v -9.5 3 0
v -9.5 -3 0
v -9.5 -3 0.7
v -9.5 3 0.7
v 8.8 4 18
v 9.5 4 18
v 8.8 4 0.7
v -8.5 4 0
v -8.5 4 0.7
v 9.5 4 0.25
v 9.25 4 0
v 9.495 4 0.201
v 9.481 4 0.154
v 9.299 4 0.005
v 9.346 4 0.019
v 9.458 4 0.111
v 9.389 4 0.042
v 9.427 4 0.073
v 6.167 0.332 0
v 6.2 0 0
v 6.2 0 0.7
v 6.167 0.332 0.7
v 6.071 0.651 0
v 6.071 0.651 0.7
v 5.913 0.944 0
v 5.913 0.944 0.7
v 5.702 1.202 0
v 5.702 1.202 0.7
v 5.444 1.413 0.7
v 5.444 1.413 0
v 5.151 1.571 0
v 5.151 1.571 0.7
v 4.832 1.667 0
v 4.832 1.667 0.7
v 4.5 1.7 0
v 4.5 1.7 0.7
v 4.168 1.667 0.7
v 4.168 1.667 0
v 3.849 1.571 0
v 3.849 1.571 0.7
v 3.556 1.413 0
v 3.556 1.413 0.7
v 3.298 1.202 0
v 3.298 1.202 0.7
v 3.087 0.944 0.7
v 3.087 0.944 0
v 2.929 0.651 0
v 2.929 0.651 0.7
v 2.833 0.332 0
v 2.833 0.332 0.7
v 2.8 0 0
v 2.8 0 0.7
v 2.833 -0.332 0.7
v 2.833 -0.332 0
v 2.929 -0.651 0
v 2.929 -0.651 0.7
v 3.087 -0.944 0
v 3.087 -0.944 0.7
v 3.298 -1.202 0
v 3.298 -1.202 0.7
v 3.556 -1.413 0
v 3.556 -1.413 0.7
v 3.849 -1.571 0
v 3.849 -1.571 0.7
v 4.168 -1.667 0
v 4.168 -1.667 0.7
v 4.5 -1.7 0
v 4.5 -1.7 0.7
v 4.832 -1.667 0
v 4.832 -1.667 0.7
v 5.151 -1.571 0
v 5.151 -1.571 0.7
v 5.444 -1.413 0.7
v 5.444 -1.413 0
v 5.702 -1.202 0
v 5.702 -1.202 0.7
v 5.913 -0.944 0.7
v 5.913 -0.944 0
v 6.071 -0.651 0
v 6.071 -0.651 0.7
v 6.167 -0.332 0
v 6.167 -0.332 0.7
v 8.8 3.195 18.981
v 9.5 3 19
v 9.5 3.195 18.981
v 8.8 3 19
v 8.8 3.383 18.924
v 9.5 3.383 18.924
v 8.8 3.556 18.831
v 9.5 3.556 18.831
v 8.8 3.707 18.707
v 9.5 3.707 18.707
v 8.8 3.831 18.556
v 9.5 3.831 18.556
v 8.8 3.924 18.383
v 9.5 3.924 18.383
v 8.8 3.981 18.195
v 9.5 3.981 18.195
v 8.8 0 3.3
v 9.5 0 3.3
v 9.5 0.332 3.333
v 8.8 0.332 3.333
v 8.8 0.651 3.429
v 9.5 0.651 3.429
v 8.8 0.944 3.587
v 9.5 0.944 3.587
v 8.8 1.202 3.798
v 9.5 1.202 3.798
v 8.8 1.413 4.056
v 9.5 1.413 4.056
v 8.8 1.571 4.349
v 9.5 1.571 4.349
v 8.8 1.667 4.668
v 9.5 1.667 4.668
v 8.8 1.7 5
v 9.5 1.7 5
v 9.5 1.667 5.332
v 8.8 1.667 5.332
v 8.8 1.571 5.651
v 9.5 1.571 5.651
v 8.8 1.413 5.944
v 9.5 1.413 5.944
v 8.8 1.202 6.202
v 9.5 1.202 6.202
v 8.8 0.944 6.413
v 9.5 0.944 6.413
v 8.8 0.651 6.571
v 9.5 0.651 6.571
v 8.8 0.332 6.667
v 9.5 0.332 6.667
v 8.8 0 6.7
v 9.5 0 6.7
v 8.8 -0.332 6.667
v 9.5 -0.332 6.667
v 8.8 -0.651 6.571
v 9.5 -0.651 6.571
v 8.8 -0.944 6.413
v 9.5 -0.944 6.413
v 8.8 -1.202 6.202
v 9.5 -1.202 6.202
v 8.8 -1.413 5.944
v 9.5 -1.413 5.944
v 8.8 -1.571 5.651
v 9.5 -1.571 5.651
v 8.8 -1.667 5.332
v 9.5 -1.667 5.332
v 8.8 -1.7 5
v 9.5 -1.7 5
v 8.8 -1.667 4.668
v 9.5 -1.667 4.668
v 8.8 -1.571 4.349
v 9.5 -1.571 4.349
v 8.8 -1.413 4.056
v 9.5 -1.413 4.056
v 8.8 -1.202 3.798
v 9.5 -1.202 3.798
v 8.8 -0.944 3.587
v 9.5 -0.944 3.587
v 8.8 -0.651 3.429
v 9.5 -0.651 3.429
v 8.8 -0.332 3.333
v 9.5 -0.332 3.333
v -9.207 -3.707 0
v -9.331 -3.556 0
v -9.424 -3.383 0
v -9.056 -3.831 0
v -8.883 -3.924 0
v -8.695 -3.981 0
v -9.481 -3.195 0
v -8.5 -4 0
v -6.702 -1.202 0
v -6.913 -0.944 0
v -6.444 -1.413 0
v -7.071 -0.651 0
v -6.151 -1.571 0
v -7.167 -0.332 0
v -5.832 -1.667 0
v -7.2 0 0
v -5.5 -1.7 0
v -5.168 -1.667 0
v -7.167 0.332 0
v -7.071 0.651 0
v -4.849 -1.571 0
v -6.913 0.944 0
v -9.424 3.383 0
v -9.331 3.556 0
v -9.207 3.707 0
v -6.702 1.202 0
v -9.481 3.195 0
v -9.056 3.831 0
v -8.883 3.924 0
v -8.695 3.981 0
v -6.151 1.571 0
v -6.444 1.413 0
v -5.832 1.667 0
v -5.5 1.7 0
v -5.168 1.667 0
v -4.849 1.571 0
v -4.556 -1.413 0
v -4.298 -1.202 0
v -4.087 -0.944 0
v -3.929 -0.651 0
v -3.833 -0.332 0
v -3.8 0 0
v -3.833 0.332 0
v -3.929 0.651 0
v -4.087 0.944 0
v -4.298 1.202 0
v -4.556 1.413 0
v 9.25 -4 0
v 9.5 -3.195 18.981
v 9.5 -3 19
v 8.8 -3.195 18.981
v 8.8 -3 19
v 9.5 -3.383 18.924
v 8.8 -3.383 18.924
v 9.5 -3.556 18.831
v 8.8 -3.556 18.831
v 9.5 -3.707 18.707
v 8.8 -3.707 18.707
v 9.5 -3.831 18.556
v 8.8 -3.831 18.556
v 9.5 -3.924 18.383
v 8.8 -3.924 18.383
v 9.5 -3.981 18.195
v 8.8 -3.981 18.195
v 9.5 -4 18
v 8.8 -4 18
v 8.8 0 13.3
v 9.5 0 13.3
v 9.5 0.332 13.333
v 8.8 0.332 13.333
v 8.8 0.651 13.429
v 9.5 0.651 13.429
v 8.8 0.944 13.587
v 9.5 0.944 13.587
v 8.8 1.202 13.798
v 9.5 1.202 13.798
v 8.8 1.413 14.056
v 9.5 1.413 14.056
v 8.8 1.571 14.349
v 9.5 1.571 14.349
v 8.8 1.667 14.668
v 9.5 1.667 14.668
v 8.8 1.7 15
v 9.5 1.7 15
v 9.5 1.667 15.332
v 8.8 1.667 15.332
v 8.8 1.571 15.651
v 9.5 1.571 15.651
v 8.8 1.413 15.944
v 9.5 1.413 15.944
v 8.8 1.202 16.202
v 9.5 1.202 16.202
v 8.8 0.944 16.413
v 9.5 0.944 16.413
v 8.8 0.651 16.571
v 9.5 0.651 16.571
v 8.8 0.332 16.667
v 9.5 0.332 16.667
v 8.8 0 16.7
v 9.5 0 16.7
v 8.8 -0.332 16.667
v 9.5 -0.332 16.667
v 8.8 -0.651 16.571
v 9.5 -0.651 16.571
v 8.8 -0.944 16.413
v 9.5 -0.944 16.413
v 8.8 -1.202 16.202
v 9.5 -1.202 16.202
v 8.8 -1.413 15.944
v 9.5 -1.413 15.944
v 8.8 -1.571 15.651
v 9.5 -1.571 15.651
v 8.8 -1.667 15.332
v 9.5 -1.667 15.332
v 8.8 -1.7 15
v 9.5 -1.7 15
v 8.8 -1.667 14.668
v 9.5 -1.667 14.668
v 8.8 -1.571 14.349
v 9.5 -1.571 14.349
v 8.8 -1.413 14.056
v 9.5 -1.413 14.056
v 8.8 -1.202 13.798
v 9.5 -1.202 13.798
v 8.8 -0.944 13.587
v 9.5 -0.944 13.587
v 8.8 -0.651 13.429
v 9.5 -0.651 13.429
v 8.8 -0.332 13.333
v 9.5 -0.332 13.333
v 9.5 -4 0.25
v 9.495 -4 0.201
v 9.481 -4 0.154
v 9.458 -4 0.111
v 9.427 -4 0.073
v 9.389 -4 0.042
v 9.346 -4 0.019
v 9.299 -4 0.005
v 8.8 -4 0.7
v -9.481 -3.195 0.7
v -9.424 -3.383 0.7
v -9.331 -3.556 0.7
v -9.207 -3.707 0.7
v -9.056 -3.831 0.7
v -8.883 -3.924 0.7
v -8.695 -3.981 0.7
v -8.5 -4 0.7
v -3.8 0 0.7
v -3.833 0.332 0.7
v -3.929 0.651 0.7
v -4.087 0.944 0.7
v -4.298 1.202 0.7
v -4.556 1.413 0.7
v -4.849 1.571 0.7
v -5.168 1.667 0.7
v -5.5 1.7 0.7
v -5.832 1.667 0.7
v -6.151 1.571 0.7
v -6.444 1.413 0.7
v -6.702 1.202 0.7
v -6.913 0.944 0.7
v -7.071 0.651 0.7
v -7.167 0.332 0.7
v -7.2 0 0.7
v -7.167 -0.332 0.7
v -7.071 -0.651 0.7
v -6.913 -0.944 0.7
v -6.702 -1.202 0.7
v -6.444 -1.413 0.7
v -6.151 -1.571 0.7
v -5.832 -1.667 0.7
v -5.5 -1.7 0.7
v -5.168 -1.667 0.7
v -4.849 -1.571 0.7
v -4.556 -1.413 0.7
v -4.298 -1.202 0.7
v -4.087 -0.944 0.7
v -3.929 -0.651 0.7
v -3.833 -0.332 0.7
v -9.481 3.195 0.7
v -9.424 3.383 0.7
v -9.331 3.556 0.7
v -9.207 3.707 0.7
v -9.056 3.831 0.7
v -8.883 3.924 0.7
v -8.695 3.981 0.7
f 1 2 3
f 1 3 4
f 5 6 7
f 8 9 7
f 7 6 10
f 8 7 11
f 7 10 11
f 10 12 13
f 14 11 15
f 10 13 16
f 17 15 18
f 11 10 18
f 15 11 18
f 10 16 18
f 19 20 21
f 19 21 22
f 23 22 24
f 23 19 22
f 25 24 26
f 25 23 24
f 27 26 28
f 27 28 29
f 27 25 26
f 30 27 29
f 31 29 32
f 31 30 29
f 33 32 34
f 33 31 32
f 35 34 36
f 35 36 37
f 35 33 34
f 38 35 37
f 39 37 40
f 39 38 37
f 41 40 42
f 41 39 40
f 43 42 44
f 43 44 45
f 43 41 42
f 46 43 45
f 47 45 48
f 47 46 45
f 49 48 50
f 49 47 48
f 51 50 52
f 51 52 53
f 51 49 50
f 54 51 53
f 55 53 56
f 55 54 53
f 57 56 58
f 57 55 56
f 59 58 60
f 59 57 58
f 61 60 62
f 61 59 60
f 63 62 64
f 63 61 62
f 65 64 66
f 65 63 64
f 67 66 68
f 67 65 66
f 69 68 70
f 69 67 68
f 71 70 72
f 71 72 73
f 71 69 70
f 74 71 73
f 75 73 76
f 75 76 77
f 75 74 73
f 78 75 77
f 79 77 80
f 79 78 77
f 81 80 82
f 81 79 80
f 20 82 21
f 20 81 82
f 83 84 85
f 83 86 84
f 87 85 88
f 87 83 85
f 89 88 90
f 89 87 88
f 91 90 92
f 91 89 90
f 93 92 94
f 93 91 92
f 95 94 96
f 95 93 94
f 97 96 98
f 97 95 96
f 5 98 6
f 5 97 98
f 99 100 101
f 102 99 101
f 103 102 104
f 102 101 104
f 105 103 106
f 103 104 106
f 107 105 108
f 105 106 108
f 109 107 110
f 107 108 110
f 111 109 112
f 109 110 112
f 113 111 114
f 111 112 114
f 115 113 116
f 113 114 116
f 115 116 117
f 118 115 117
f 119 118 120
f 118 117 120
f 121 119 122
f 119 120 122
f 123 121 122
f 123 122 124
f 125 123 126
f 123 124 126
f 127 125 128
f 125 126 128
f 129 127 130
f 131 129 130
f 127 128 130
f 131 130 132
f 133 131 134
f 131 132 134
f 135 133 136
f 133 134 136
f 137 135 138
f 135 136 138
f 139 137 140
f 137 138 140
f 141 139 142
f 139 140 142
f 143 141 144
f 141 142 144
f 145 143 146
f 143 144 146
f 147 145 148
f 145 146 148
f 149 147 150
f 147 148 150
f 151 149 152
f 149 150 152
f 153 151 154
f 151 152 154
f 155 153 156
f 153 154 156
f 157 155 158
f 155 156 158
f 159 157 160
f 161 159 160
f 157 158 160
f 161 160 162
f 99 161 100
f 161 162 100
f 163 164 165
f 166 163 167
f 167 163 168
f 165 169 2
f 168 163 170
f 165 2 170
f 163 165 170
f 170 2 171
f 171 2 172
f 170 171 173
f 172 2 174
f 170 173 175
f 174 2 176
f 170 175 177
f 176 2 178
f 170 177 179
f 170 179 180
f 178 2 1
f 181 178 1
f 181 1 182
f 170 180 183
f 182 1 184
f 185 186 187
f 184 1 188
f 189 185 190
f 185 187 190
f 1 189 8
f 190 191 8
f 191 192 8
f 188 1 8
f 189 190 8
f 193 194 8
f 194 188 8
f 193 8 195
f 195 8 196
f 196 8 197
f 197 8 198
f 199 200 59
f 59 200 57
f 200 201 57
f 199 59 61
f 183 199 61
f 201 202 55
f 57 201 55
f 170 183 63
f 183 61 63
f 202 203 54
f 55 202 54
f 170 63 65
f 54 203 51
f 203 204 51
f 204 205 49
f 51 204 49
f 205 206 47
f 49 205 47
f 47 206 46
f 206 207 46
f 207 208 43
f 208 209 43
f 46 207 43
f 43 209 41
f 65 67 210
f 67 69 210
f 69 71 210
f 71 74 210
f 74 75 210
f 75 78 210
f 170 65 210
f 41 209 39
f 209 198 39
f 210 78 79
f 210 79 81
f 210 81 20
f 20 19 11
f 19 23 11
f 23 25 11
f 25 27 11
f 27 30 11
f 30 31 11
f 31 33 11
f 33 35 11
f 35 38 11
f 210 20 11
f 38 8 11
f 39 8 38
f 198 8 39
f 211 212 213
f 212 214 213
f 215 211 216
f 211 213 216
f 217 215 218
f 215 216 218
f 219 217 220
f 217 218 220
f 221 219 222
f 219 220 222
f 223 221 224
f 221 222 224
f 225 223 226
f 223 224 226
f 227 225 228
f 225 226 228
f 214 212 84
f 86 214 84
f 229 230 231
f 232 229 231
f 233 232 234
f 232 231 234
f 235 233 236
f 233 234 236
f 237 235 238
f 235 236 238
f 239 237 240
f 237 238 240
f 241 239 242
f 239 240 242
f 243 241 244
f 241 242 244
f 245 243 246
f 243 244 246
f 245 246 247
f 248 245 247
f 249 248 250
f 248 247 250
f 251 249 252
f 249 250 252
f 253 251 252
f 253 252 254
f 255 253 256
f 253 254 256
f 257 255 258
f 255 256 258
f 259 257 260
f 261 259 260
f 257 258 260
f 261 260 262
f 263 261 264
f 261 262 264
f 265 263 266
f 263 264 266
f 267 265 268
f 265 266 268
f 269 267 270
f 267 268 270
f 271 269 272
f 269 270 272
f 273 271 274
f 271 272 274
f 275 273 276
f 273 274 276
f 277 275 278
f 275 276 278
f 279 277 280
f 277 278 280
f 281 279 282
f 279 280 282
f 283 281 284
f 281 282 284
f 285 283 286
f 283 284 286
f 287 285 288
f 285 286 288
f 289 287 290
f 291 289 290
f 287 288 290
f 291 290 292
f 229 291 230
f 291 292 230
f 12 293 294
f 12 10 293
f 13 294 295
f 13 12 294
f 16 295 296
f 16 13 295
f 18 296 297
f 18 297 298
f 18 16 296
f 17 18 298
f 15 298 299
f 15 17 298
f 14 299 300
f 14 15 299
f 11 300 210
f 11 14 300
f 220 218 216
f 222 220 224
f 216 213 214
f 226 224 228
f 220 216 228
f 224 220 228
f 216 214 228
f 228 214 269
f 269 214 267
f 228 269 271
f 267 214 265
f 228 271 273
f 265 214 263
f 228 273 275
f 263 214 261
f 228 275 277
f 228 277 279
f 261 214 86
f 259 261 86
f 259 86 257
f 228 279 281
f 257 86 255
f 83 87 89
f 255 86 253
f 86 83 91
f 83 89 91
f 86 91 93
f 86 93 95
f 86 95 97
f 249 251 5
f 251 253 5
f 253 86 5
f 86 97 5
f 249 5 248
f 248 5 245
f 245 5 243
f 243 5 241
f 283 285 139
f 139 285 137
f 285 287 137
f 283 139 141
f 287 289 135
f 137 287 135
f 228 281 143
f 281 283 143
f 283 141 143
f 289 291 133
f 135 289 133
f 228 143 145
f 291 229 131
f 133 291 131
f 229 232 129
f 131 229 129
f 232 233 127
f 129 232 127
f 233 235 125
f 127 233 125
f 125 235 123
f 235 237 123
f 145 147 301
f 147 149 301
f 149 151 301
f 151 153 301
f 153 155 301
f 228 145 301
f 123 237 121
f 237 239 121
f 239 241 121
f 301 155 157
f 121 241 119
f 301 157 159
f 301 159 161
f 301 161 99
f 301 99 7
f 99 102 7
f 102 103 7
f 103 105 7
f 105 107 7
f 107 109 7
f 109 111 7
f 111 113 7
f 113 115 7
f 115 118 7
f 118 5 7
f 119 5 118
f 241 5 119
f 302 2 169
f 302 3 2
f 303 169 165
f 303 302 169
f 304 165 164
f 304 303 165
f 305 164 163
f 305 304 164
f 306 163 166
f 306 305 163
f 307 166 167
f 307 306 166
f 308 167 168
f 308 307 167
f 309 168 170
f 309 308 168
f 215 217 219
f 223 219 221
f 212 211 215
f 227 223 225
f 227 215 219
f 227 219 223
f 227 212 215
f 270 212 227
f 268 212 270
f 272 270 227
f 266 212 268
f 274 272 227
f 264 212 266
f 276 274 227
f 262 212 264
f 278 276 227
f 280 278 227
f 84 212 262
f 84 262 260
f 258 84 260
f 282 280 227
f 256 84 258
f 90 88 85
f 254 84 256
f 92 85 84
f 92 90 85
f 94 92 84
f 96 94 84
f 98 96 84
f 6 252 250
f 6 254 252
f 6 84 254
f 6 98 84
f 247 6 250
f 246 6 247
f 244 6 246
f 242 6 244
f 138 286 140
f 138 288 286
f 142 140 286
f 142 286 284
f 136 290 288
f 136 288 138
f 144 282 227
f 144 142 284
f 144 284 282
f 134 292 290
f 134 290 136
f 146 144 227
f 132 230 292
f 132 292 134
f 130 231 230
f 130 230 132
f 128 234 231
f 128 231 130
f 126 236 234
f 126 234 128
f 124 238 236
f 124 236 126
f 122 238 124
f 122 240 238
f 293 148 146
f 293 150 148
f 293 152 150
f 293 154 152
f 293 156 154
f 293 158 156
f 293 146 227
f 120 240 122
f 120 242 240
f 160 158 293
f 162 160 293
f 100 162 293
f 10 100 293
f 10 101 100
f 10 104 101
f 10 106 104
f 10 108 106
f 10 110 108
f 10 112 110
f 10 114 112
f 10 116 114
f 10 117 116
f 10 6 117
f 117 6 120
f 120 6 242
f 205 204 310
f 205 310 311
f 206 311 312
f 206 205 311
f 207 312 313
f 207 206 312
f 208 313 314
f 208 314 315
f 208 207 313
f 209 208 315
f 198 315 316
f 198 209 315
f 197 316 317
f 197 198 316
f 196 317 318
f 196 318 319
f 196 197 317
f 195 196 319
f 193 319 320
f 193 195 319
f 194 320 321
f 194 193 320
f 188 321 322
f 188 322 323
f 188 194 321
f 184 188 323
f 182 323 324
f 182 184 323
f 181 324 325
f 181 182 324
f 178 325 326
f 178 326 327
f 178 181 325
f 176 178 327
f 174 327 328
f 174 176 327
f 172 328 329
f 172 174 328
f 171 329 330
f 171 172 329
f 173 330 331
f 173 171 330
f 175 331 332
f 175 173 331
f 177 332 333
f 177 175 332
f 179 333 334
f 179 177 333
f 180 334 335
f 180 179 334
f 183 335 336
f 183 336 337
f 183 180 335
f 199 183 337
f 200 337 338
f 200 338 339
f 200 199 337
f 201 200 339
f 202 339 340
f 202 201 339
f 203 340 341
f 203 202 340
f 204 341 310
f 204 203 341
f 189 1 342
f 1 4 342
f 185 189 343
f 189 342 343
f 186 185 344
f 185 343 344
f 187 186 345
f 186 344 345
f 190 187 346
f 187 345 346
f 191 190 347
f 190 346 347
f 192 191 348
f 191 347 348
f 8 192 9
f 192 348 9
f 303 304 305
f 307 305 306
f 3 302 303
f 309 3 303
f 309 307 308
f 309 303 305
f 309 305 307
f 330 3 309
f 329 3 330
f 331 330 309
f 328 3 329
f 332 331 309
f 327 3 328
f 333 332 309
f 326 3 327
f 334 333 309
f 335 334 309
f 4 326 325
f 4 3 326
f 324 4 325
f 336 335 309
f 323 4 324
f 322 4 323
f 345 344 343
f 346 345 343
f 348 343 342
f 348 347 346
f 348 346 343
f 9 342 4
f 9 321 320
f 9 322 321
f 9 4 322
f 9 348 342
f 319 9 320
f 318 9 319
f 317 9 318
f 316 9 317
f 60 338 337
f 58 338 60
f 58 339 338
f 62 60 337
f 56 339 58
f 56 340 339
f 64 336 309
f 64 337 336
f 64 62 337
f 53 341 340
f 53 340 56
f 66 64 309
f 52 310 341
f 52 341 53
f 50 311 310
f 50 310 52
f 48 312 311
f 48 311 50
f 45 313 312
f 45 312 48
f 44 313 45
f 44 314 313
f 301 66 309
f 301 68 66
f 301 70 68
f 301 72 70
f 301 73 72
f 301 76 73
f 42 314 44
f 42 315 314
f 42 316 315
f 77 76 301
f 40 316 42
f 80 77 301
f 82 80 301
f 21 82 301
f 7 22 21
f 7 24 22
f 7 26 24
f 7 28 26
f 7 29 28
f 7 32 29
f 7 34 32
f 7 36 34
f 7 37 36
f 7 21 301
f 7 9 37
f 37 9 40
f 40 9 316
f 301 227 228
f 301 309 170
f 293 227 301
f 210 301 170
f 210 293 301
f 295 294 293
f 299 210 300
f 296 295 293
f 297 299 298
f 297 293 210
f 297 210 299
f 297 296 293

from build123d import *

# Parameters (mm, degrees)
SKETCH_1_W      = 19
SKETCH_1_H      = 8
SKETCH_1_R      = 1.7
EXTRUDE_1_DEPTH = 0.7
SKETCH_2_W      = 19
SKETCH_2_H      = 8
SKETCH_2_R      = 1.7
EXTRUDE_2_DEPTH = 0.7
FILLET_1_R      = 1
FILLET_2_R      = 0.25


with BuildPart() as part:
    # 草图1 → 凸台-拉伸1 (new body)
    with BuildSketch(Plane.XY):
        Rectangle(SKETCH_1_W, SKETCH_1_H)
        with Locations((-5.5, 0)):
            Circle(SKETCH_1_R, mode=Mode.SUBTRACT)
        with Locations((4.5, 0)):
            Circle(SKETCH_1_R, mode=Mode.SUBTRACT)
    extrude(amount=EXTRUDE_1_DEPTH)

    # 草图2 → 凸台-拉伸2 (add)
    with BuildSketch(Plane(origin=(9.5, 0, 0), x_dir=(0, 0, -1), z_dir=(1, 0, 0))):
        with Locations((-9.5, 0)):
            Rectangle(SKETCH_2_W, SKETCH_2_H)
        with Locations((-5, 0)):
            Circle(SKETCH_2_R, mode=Mode.SUBTRACT)
        with Locations((-15, 0)):
            Circle(SKETCH_2_R, mode=Mode.SUBTRACT)
    extrude(amount=-EXTRUDE_2_DEPTH)

    # 圆角1
    fillet_1_edges = [part.edges().sort_by_distance(p)[0] for p in [
        (9.15, 4, 19),
        (9.15, -4, 19),
        (-9.5, -4, 0.35),
        (-9.5, 4, 0.35),
    ]]
    fillet(fillet_1_edges, radius=FILLET_1_R)

    # 圆角2
    fillet_2_edges = [part.edges().sort_by_distance(p)[0] for p in [
        (9.5, 0, 0),
    ]]
    fillet(fillet_2_edges, radius=FILLET_2_R)


solid = part.part
